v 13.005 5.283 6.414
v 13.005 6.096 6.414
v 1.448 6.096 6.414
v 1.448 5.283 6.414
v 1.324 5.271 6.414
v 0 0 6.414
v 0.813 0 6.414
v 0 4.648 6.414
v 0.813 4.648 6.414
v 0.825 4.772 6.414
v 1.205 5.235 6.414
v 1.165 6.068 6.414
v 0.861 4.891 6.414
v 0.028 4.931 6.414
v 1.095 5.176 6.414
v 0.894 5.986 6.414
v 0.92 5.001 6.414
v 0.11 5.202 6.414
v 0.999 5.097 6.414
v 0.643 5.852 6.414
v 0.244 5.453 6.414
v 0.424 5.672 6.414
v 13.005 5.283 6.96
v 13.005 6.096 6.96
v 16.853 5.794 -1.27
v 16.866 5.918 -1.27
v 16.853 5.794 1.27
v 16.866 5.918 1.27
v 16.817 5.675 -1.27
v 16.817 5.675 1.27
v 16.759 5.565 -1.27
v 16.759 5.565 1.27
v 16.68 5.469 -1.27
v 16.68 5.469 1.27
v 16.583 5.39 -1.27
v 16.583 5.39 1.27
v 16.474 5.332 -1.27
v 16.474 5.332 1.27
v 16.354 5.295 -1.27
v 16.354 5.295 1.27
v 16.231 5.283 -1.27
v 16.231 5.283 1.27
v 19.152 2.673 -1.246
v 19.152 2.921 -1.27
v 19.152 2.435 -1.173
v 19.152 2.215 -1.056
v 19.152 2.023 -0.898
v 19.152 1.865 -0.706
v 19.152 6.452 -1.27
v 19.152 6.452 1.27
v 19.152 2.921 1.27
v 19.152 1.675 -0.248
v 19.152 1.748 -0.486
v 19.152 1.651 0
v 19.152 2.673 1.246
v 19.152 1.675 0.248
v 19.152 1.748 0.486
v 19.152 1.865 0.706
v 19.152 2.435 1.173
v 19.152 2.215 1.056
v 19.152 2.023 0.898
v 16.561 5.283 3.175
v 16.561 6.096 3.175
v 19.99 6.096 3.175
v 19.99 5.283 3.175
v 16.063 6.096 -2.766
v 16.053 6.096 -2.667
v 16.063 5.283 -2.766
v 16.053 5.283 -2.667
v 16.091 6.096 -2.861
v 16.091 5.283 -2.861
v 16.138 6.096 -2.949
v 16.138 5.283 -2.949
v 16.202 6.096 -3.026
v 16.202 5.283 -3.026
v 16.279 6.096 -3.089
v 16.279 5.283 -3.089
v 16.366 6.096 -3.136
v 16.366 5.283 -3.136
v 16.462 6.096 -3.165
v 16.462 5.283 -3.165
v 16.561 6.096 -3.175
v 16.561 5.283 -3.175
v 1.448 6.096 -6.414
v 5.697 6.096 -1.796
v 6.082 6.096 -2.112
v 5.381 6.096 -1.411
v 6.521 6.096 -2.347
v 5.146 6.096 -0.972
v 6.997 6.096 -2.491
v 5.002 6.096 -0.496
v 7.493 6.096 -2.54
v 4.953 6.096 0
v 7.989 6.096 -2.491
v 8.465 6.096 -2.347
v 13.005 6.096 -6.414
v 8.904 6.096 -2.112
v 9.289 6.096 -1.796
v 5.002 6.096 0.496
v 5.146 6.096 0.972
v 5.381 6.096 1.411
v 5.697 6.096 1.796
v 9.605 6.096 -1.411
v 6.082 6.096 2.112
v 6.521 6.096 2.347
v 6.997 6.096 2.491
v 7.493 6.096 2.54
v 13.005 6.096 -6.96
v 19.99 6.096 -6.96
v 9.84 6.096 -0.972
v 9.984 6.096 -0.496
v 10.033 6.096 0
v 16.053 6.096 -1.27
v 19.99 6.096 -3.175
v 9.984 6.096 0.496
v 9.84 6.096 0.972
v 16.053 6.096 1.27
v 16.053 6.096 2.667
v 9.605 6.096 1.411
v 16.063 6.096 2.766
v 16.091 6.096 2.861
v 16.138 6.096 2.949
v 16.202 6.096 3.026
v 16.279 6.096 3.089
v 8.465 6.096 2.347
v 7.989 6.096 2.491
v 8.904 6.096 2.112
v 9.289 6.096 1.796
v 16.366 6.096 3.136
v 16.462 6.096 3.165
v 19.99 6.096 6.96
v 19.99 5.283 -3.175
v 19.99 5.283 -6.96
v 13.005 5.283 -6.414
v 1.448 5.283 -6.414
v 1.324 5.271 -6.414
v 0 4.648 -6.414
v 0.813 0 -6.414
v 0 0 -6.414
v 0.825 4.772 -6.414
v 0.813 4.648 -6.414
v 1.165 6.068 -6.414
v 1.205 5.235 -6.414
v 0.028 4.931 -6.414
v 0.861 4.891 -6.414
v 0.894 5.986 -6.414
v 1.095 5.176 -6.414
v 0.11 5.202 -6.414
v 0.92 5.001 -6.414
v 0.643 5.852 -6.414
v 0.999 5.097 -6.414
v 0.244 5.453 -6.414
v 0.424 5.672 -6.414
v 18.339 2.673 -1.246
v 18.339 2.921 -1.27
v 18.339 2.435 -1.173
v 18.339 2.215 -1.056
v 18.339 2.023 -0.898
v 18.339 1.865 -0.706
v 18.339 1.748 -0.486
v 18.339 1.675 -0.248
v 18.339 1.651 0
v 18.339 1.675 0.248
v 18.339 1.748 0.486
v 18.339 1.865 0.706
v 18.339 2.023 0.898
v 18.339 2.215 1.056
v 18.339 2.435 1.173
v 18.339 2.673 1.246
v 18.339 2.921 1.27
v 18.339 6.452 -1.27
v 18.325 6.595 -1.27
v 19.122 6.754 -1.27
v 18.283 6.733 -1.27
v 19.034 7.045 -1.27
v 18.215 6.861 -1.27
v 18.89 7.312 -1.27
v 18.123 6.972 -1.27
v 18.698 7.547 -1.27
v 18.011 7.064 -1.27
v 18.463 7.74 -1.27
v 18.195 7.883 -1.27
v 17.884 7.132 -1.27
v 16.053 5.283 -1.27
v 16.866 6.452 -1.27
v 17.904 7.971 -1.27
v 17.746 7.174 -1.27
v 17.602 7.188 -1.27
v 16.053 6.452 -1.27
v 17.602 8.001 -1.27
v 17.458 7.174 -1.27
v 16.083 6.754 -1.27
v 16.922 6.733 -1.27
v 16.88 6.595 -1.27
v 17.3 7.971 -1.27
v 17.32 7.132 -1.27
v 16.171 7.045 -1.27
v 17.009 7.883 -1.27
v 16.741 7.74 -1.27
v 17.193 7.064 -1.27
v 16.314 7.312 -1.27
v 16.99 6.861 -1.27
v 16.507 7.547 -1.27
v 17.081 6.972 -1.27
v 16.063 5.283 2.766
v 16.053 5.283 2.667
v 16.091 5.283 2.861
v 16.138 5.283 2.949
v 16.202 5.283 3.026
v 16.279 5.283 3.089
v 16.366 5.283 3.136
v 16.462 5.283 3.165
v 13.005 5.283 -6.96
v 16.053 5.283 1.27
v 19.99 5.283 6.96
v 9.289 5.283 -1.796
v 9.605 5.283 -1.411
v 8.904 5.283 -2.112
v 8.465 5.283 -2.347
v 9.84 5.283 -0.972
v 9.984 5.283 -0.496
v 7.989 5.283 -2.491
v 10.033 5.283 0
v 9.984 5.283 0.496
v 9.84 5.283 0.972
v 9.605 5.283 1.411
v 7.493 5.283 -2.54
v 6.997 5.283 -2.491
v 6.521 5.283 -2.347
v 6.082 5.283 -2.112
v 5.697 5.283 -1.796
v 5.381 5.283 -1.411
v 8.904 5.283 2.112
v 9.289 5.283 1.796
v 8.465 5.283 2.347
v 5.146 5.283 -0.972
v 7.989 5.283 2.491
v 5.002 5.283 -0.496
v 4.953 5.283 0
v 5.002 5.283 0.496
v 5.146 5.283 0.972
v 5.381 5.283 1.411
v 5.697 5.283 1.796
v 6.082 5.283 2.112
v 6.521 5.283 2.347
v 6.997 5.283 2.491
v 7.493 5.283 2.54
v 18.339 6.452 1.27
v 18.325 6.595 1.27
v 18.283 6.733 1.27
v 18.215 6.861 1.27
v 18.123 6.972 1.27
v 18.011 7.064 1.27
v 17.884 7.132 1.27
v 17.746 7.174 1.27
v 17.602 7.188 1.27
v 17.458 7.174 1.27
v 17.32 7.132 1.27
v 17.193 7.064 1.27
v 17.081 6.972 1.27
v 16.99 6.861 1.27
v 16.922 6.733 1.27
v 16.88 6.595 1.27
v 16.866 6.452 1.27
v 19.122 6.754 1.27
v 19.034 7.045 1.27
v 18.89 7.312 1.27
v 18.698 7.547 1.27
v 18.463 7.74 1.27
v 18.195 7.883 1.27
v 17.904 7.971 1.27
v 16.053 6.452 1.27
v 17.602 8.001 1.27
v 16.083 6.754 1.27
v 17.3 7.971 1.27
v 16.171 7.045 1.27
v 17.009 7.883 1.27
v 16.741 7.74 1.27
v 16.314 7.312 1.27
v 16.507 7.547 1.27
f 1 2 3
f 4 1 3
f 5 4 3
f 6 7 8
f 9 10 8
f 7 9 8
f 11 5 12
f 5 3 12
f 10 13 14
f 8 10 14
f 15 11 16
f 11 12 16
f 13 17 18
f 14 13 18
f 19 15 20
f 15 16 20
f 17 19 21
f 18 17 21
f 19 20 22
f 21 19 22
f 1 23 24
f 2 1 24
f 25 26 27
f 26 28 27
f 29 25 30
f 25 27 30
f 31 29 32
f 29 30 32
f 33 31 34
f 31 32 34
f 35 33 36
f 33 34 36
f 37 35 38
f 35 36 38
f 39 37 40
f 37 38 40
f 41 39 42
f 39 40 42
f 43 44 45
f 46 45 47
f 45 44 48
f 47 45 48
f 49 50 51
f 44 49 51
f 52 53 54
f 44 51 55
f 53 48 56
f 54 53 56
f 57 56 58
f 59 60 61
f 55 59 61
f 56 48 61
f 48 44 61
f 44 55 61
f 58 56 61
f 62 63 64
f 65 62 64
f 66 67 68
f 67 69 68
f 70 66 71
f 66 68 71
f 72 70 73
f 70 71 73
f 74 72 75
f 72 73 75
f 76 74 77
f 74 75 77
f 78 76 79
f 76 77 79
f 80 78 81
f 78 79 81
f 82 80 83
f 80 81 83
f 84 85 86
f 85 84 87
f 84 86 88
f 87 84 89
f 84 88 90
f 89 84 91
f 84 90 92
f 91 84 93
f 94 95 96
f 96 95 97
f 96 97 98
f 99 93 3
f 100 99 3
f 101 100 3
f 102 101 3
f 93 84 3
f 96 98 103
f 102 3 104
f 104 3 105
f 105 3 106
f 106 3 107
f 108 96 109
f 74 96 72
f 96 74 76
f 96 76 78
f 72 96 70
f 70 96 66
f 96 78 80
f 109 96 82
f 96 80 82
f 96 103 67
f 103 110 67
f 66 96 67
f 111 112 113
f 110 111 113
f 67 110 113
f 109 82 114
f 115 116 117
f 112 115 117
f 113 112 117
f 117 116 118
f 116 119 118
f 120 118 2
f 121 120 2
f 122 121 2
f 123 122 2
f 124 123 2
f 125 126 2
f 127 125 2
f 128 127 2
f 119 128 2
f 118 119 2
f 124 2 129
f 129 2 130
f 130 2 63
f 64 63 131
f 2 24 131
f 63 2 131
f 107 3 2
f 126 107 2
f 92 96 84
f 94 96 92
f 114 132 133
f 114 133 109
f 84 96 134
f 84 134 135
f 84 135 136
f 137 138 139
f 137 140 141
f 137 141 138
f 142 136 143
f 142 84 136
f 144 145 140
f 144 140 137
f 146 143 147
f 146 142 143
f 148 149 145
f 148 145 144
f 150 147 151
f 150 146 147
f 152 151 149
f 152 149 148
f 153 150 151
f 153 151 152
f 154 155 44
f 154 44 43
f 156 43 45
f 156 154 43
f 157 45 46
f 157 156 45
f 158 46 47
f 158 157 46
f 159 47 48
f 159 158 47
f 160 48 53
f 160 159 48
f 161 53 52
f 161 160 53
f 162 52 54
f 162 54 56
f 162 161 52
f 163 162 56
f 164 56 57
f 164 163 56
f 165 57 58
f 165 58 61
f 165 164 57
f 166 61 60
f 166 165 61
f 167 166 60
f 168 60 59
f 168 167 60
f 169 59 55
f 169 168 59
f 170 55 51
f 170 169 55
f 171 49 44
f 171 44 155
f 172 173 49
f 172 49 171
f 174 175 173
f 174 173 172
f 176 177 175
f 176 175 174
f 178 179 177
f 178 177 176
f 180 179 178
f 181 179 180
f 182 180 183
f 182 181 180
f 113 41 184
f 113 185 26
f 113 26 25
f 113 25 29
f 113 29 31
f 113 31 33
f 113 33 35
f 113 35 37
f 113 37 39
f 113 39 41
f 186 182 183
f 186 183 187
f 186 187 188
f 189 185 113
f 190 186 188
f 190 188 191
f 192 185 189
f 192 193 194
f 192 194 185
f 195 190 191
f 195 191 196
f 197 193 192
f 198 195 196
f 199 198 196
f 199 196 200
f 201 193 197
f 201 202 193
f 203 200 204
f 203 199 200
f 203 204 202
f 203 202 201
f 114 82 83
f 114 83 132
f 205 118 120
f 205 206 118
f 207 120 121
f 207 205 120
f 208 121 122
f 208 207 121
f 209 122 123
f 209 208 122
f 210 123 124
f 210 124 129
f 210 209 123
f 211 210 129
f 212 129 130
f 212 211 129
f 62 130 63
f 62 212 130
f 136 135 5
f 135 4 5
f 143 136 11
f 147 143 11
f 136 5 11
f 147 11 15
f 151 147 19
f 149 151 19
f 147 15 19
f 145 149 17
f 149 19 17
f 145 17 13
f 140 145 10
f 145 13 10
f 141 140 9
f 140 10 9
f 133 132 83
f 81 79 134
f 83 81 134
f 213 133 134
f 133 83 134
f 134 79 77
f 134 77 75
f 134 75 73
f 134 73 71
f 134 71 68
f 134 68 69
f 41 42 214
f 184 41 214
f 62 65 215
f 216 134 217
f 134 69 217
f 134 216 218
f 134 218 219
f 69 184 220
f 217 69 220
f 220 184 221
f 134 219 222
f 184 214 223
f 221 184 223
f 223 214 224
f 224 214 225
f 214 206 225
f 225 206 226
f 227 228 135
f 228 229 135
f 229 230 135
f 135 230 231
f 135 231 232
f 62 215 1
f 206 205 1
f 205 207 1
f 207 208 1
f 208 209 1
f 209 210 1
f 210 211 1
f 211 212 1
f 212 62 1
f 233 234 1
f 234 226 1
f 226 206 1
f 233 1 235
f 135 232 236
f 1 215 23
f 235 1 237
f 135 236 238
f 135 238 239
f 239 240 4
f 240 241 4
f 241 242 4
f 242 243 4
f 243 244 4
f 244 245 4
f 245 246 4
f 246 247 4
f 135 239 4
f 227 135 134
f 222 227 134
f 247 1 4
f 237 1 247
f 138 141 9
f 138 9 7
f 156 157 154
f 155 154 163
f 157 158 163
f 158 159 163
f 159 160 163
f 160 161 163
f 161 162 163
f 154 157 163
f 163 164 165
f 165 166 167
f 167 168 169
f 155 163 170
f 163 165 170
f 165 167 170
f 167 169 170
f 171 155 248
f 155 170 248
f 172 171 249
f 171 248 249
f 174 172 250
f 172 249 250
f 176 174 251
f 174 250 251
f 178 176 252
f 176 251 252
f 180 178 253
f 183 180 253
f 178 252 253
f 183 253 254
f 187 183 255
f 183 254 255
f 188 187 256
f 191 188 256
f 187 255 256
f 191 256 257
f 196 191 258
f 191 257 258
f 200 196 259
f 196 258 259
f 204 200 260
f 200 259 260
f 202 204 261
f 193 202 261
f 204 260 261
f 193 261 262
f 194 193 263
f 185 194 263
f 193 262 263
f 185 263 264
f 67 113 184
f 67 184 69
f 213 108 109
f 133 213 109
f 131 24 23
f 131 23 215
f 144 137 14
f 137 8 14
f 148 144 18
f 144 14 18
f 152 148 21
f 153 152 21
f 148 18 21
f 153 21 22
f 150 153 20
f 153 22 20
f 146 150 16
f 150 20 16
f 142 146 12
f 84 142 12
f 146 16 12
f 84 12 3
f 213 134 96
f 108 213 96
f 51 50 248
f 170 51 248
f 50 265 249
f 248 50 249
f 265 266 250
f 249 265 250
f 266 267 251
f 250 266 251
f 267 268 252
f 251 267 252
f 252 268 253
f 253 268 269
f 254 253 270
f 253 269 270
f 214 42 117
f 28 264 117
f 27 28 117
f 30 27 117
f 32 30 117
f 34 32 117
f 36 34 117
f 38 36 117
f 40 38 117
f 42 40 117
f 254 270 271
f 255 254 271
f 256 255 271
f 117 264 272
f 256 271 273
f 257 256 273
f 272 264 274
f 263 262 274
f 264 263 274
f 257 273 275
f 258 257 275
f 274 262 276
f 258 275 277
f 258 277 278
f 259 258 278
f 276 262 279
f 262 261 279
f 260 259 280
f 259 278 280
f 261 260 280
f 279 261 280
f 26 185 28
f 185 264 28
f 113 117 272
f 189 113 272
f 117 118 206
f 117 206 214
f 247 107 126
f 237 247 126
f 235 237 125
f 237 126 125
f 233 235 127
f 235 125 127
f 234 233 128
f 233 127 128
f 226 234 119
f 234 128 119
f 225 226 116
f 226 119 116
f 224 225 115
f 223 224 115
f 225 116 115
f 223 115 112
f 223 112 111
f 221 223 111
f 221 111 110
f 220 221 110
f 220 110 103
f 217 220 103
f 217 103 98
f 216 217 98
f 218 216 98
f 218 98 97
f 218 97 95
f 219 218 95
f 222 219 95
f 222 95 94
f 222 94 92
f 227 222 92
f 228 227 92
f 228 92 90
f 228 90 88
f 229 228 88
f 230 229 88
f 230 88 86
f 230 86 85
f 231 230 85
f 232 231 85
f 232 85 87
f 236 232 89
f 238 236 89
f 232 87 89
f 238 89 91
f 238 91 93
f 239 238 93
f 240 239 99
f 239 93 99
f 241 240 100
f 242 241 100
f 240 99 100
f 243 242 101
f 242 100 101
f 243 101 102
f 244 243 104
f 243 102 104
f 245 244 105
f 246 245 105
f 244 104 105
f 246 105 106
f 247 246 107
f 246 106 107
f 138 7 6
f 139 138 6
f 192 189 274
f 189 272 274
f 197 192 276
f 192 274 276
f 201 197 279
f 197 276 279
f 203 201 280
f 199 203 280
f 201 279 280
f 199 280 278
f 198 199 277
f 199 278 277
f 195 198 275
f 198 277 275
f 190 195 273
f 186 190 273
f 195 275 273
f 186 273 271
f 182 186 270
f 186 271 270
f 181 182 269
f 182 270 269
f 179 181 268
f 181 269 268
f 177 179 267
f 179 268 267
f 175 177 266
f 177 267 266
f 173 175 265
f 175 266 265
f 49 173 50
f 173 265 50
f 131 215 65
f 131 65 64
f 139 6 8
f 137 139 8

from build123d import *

# Parameters (mm, degrees)
EXTRUDE_THIN1_DEPTH = 6.4135
SKETCH2_W           = 6.985
SKETCH2_H           = 0.8128
BOSS_EXTRUDE1_DEPTH = 6.9596
SKETCH3_W           = 3.937
SKETCH3_H           = 6.35
CUT_EXTRUDE1_DEPTH  = 23.027014146
EXTRUDE_THIN2_DEPTH = 1.27
FILLET1_RADIUS      = 1.27
FILLET1_LENGTH      = 0.8128
FILLET2_R           = 0.635
SKETCH5_R           = 2.54
CUT_EXTRUDE2_DEPTH  = 23.027014146
FILLET3_R           = 0.508


with BuildPart() as part:
    # Sketch1 → Extrude-Thin1 (new, symmetric)
    with BuildSketch(Plane.XY):
        with BuildLine():
            Line((0, 0), (0, 4.6482))
            ThreePointArc((0, 4.6482), (0.424050802, 5.671949198), (1.4478, 6.096))
            Line((1.4478, 6.096), (19.9898, 6.096))
            Line((19.9898, 6.096), (19.9898, 5.2832))
            Line((19.9898, 5.2832), (1.4478, 5.2832))
            ThreePointArc((1.4478, 5.2832), (0.998787194, 5.097212806), (0.8128, 4.6482))
            Line((0.8128, 4.6482), (0.8128, 0))
            Line((0.8128, 0), (0, 0))
        make_face()
    extrude(amount=EXTRUDE_THIN1_DEPTH, both=True)

    # Sketch2 → Boss-Extrude1 (add, symmetric)
    with BuildSketch(Plane.XY):
        with Locations((16.4973, 5.6896)):
            Rectangle(SKETCH2_W, SKETCH2_H)
    extrude(amount=BOSS_EXTRUDE1_DEPTH, both=True)

    # Sketch3 → Cut-Extrude1 (cut, through all)
    with BuildSketch(Plane(origin=(0, 6.096, 0), x_dir=(1, 0, 0), z_dir=(0, 1, 0))):
        with Locations((18.0213, 0)):
            Rectangle(SKETCH3_W, SKETCH3_H)
    extrude(amount=-CUT_EXTRUDE1_DEPTH, mode=Mode.SUBTRACT)

    # Sketch4 → Extrude-Thin2 (add, symmetric)
    with BuildSketch(Plane.XY):
        with BuildLine():
            Line((16.0528, 5.2832), (16.0528, 6.4516))
            ThreePointArc((16.0528, 6.4516), (17.6022, 8.001), (19.1516, 6.4516))
            Line((19.1516, 6.4516), (19.1516, 1.651))
            Line((19.1516, 1.651), (18.3388, 1.651))
            Line((18.3388, 1.651), (18.3388, 6.4516))
            ThreePointArc((18.3388, 6.4516), (17.6022, 7.1882), (16.8656, 6.4516))
            Line((16.8656, 6.4516), (16.8656, 5.2832))
            Line((16.8656, 5.2832), (16.0528, 5.2832))
        make_face()
    extrude(amount=EXTRUDE_THIN2_DEPTH, both=True)

    # Fillet1: full round fillet: the end face becomes a half cylinder, R = half its width
    fillet1_face = Plane((18.7452, 1.651, 0), x_dir=(-1, 0, 0), z_dir=(0, -1, 0))  # on the end face: x along it, z out of the body
    fillet1_slab = fillet1_face.offset(-FILLET1_RADIUS / 2) * Box(FILLET1_LENGTH, 2 * FILLET1_RADIUS, FILLET1_RADIUS, mode=Mode.PRIVATE)  # the body's end, R deep
    fillet1_round = Plane((18.7452, 2.921, 0), x_dir=(0, -1, 0), z_dir=(-1, 0, 0)) * Cylinder(FILLET1_RADIUS, FILLET1_LENGTH, mode=Mode.PRIVATE)  # its axis R under the face
    add(fillet1_slab - fillet1_round, mode=Mode.SUBTRACT)

    # Fillet2
    fillet2_edges = [part.edges().sort_by_distance(p)[0] for p in [
        (16.8656, 5.2832, 0),
    ]]
    fillet(fillet2_edges, radius=FILLET2_R)

    # Sketch5 → Cut-Extrude2 (cut, through all)
    with BuildSketch(Plane(origin=(0, 6.096, 0), x_dir=(1, 0, 0), z_dir=(0, 1, 0))):
        with Locations(Location((7.493, 0, 0), (0, 0, 270))):
            Circle(SKETCH5_R)
    extrude(amount=-CUT_EXTRUDE2_DEPTH, mode=Mode.SUBTRACT)

    # Fillet3
    fillet3_edges = [part.edges().sort_by_distance(p)[0] for p in [
        (16.0528, 5.6896, 3.175),
        (16.0528, 5.6896, -3.175),
    ]]
    fillet(fillet3_edges, radius=FILLET3_R)


solid = part.part
